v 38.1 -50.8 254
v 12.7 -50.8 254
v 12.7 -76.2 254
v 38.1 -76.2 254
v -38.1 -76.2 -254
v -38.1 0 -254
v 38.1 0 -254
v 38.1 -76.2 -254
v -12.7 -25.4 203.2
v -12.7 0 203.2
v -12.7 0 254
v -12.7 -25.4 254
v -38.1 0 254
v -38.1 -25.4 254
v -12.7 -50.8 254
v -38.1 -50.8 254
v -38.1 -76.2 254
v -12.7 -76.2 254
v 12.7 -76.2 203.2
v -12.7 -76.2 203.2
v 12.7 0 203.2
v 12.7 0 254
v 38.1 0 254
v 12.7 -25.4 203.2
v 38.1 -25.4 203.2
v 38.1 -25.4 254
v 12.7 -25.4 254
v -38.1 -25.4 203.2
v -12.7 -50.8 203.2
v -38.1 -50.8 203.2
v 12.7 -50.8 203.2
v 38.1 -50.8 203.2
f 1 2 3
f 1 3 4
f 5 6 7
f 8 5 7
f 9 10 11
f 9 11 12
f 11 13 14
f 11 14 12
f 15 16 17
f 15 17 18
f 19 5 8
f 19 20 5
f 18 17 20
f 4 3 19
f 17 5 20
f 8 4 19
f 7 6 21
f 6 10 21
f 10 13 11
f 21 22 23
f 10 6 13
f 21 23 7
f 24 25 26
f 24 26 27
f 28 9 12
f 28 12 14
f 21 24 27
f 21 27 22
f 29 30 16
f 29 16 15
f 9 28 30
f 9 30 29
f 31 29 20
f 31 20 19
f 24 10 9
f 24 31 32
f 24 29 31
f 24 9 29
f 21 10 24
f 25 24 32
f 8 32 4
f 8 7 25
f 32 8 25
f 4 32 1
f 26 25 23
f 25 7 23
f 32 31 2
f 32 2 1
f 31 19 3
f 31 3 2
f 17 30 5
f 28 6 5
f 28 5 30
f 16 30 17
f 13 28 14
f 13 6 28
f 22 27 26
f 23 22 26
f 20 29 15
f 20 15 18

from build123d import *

# Parameters (mm, degrees)
F0_W     = 76.2
F0_H     = 508
F1_DEPTH = 76.2
F3_DEPTH = 50.8


with BuildPart() as f1:
    # F0 (on Front) → F1 (new body)
    with BuildSketch(Plane.XZ):
        Rectangle(F0_W, F0_H)
    extrude(amount=F1_DEPTH)

    # F2 (on face) → F3 (cut)
    with BuildSketch(Plane.XY.offset(254)):
        Polygon((12.7, 0), (-12.7, 0), (-12.7, -25.4), (-38.1, -25.4), (-38.1, -50.8), (-12.7, -50.8), (-12.7, -76.2), (12.7, -76.2), (12.7, -50.8), (38.1, -50.8), (38.1, -25.4), (12.7, -25.4), align=None)
    extrude(amount=-F3_DEPTH, mode=Mode.SUBTRACT)


solid = f1.part
